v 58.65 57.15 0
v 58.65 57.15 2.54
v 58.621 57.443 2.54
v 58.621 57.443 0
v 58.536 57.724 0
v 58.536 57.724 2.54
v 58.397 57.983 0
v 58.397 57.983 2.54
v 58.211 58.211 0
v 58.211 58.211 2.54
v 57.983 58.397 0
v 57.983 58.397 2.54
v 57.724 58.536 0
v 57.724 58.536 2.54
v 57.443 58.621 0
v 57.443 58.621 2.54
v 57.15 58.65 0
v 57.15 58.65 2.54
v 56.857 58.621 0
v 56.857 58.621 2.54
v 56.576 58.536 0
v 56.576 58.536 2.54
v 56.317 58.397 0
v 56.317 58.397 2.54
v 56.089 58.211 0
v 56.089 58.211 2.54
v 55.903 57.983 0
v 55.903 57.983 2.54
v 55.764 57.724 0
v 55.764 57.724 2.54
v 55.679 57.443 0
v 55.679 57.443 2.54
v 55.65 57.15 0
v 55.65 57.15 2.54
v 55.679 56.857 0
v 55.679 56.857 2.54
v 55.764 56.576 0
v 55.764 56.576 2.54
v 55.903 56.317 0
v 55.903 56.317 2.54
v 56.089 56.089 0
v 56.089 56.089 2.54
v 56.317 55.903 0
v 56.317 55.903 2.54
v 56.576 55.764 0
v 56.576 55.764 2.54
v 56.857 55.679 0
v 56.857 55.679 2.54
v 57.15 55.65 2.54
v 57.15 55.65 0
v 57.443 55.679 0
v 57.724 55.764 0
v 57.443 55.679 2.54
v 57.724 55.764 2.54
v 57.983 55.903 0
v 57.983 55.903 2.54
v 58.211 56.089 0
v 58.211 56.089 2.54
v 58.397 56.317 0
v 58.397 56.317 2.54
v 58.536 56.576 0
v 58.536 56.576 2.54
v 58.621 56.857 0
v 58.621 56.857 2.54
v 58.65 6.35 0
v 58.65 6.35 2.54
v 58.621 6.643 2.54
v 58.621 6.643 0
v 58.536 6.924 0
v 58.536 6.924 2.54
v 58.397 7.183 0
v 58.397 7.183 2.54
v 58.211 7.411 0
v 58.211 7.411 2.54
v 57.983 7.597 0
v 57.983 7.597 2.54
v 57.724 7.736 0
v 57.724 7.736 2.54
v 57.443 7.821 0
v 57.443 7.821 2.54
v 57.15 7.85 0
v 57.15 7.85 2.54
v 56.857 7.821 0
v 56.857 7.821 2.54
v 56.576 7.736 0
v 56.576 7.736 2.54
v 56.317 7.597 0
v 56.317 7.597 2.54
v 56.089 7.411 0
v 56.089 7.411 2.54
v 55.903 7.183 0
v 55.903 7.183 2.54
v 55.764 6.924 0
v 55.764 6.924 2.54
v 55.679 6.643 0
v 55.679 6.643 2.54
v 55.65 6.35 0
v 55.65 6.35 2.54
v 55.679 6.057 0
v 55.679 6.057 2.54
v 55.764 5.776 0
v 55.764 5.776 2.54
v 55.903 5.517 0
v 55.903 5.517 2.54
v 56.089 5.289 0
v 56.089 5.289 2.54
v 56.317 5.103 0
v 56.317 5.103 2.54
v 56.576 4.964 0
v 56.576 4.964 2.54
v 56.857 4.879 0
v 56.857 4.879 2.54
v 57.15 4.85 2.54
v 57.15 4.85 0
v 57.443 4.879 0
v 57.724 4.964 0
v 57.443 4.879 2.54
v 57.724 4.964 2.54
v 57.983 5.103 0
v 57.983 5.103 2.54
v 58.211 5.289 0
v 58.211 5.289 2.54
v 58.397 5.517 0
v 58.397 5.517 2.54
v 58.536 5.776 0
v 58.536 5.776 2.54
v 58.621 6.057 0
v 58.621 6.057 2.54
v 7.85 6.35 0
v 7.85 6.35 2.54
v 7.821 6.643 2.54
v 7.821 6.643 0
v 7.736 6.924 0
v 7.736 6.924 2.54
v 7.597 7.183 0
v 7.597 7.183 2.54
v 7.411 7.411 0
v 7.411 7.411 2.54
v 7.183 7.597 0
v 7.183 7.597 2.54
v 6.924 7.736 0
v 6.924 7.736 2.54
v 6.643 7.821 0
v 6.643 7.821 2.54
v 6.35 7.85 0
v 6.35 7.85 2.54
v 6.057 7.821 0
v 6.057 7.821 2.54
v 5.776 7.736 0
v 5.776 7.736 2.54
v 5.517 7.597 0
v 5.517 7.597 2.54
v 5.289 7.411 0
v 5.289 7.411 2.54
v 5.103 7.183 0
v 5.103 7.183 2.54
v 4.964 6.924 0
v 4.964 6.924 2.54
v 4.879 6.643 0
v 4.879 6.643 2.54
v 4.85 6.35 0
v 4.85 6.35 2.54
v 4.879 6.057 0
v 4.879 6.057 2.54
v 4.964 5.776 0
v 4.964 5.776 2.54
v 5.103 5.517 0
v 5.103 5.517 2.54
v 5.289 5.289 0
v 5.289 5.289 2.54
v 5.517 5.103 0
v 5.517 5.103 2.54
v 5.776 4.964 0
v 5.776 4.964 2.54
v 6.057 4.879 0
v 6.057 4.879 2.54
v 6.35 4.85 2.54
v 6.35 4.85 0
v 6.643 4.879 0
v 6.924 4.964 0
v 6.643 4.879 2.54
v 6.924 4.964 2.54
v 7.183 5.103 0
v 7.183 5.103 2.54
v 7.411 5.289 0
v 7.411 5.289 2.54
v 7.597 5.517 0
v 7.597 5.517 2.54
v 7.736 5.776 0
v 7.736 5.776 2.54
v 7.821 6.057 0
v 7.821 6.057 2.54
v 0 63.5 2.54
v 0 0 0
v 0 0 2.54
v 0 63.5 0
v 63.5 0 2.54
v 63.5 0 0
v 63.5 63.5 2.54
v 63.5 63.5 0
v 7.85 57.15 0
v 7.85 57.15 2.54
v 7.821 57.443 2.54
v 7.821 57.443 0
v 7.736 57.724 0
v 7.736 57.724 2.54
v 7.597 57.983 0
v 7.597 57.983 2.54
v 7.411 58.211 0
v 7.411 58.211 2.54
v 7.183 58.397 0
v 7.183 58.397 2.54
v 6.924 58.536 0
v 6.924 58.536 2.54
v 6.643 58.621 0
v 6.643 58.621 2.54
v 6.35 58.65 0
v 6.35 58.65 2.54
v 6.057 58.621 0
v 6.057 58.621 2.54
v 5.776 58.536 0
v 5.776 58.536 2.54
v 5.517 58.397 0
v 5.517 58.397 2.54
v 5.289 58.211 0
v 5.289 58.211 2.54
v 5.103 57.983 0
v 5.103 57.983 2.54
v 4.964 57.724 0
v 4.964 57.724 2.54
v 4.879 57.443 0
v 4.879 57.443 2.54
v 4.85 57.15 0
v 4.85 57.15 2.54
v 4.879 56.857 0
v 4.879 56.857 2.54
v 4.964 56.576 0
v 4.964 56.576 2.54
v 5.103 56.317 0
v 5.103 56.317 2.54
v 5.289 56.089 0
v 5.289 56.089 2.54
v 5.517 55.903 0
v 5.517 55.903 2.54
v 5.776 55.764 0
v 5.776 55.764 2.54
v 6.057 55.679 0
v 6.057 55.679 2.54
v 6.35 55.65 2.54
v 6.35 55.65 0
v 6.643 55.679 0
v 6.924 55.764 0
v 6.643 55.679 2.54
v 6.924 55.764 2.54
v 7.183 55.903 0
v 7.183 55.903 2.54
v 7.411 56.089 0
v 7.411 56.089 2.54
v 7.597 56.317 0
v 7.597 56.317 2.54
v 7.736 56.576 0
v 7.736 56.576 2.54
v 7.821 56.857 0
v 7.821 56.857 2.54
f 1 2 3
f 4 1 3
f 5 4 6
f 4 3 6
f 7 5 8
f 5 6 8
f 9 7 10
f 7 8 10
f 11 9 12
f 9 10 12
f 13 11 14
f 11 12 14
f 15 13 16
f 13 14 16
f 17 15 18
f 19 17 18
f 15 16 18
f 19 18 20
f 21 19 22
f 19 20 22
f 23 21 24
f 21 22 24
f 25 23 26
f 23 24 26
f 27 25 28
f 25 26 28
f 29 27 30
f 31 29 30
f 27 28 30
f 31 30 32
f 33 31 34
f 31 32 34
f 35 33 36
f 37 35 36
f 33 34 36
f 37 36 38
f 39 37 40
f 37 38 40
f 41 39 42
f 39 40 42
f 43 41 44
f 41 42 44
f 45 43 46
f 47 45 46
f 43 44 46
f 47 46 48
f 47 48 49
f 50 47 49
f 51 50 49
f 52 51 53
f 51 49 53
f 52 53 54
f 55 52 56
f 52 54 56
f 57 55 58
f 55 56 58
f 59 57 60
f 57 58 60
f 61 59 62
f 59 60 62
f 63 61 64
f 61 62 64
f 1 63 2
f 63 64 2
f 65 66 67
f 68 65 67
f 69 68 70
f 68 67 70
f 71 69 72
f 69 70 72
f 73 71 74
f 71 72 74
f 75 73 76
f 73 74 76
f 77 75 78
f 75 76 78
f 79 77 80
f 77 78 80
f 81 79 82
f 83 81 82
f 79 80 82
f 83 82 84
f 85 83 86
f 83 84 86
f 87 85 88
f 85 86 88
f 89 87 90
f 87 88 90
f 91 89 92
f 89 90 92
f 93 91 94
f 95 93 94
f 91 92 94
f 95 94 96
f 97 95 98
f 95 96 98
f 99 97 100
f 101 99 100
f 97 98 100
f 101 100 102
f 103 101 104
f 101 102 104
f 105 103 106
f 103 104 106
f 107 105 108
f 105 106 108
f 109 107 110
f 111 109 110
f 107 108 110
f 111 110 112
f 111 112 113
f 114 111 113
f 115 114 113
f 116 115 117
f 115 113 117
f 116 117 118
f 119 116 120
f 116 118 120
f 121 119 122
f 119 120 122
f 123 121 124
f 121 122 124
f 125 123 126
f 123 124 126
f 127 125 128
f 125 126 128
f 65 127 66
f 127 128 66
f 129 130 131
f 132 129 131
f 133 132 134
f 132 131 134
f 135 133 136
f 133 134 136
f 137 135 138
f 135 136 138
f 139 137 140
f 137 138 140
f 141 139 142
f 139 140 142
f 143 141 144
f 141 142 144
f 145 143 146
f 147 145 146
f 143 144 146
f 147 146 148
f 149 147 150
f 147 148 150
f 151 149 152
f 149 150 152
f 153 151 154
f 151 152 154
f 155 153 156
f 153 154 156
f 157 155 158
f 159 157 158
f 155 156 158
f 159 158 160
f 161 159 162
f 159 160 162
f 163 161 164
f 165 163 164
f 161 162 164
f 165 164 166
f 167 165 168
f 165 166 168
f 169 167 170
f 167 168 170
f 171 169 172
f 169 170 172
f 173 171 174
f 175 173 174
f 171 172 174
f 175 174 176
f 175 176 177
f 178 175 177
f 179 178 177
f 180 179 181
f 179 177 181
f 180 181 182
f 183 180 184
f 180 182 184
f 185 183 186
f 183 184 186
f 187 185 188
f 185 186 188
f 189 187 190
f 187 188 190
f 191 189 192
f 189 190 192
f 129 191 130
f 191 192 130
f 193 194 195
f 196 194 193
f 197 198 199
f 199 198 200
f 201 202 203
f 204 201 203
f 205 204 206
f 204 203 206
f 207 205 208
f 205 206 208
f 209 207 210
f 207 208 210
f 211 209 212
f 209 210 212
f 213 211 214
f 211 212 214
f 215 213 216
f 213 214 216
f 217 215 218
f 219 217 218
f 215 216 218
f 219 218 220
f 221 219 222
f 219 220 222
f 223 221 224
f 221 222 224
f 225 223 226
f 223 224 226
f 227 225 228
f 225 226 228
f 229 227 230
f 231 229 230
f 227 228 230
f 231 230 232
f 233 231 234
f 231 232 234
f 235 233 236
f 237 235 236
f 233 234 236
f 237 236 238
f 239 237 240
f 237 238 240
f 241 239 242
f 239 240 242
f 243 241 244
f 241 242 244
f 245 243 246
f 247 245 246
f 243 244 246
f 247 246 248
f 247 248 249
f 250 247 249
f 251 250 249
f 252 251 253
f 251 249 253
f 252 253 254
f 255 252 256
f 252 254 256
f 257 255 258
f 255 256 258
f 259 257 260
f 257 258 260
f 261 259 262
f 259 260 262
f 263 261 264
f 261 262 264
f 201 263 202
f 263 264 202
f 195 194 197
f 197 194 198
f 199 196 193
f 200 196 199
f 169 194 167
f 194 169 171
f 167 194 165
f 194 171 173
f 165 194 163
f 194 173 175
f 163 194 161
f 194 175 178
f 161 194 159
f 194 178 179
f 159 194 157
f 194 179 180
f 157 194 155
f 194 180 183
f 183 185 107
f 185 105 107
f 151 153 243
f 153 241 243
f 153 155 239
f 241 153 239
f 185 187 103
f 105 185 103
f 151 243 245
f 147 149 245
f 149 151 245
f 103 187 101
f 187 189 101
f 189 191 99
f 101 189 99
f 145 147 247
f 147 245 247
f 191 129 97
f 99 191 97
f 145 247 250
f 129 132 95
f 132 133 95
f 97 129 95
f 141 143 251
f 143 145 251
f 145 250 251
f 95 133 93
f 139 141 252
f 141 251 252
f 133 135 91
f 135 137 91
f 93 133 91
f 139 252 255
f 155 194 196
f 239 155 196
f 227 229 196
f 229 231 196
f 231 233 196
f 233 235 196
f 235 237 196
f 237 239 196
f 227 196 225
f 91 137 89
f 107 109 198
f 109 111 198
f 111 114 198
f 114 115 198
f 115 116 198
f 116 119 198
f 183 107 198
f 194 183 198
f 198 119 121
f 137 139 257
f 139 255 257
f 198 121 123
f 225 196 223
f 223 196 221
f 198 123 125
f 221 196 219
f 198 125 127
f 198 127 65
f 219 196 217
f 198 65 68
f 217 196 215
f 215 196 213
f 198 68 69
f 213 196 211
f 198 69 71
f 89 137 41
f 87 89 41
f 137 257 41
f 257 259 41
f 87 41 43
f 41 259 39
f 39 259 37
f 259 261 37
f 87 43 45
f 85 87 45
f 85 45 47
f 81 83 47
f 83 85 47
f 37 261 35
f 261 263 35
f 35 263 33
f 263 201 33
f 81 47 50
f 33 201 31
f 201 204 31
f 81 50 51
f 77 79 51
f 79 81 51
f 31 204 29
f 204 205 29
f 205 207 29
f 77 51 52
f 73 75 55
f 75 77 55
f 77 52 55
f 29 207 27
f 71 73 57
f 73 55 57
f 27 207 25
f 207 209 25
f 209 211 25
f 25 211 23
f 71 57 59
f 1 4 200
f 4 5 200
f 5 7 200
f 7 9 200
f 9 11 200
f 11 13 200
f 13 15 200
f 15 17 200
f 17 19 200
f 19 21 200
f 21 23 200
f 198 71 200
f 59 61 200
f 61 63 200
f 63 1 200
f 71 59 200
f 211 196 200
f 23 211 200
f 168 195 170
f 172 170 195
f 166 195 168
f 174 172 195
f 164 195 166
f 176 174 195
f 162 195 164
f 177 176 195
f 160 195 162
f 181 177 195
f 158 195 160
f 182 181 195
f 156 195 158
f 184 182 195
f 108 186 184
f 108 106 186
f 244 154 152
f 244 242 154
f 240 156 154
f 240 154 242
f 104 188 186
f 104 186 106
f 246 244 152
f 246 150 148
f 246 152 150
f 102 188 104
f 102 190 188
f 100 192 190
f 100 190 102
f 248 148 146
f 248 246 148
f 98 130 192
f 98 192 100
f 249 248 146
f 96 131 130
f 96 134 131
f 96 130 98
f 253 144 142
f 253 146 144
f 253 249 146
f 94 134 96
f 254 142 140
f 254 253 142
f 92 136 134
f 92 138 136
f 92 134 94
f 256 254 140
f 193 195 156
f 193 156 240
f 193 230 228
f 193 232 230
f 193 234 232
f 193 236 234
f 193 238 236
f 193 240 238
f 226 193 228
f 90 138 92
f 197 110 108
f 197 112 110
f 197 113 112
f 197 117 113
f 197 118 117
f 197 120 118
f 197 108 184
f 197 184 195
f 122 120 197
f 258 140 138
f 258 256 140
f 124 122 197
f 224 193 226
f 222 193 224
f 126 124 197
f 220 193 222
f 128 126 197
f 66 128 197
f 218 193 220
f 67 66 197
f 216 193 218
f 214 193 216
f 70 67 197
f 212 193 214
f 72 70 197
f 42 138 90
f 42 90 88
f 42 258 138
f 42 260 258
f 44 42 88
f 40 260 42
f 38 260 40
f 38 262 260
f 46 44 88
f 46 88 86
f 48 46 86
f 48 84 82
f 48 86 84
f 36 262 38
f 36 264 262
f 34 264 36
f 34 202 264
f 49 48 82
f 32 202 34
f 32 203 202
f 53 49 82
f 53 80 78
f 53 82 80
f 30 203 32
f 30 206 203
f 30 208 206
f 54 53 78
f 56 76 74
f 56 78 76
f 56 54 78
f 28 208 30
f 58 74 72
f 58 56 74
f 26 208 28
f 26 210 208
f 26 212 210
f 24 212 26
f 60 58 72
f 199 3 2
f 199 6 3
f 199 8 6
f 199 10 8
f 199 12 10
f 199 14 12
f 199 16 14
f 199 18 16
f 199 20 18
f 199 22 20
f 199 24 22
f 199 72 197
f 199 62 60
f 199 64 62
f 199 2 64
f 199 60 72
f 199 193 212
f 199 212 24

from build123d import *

# Parameters (mm, degrees)
SKETCH1_W            = 63.5
SKETCH1_H            = 63.5
BOSS_EXTRUDE1_DEPTH  = 2.54
SKETCH2_R            = 1.5
CUT_EXTRUDE1_DEPTH   = 2.54
LPATTERN1_COUNT      = 2
LPATTERN1_PITCH      = 50.8
LPATTERN1_COUNT_DIR2 = 2
LPATTERN1_PITCH_DIR2 = 50.8


with BuildPart() as part:
    # Sketch1 → Boss-Extrude1 (new body)
    with BuildSketch(Plane.XY):
        with Locations((31.75, 31.75)):
            Rectangle(SKETCH1_W, SKETCH1_H)
    extrude(amount=BOSS_EXTRUDE1_DEPTH)

    # Sketch2 → Cut-Extrude1 (cut)
    with BuildSketch(Plane.XY.offset(2.54)):
        with Locations((6.35, 57.15)):
            Circle(SKETCH2_R)
    cut_extrude1 = extrude(amount=-CUT_EXTRUDE1_DEPTH, mode=Mode.SUBTRACT)

    # LPattern1: Cut-Extrude1 2 × 2
    with Locations(*[(i * LPATTERN1_PITCH, -j * LPATTERN1_PITCH_DIR2, 0) for i in range(LPATTERN1_COUNT) for j in range(LPATTERN1_COUNT_DIR2) if (i, j) != (0, 0)]):
        add(cut_extrude1, mode=Mode.SUBTRACT)


solid = part.part
